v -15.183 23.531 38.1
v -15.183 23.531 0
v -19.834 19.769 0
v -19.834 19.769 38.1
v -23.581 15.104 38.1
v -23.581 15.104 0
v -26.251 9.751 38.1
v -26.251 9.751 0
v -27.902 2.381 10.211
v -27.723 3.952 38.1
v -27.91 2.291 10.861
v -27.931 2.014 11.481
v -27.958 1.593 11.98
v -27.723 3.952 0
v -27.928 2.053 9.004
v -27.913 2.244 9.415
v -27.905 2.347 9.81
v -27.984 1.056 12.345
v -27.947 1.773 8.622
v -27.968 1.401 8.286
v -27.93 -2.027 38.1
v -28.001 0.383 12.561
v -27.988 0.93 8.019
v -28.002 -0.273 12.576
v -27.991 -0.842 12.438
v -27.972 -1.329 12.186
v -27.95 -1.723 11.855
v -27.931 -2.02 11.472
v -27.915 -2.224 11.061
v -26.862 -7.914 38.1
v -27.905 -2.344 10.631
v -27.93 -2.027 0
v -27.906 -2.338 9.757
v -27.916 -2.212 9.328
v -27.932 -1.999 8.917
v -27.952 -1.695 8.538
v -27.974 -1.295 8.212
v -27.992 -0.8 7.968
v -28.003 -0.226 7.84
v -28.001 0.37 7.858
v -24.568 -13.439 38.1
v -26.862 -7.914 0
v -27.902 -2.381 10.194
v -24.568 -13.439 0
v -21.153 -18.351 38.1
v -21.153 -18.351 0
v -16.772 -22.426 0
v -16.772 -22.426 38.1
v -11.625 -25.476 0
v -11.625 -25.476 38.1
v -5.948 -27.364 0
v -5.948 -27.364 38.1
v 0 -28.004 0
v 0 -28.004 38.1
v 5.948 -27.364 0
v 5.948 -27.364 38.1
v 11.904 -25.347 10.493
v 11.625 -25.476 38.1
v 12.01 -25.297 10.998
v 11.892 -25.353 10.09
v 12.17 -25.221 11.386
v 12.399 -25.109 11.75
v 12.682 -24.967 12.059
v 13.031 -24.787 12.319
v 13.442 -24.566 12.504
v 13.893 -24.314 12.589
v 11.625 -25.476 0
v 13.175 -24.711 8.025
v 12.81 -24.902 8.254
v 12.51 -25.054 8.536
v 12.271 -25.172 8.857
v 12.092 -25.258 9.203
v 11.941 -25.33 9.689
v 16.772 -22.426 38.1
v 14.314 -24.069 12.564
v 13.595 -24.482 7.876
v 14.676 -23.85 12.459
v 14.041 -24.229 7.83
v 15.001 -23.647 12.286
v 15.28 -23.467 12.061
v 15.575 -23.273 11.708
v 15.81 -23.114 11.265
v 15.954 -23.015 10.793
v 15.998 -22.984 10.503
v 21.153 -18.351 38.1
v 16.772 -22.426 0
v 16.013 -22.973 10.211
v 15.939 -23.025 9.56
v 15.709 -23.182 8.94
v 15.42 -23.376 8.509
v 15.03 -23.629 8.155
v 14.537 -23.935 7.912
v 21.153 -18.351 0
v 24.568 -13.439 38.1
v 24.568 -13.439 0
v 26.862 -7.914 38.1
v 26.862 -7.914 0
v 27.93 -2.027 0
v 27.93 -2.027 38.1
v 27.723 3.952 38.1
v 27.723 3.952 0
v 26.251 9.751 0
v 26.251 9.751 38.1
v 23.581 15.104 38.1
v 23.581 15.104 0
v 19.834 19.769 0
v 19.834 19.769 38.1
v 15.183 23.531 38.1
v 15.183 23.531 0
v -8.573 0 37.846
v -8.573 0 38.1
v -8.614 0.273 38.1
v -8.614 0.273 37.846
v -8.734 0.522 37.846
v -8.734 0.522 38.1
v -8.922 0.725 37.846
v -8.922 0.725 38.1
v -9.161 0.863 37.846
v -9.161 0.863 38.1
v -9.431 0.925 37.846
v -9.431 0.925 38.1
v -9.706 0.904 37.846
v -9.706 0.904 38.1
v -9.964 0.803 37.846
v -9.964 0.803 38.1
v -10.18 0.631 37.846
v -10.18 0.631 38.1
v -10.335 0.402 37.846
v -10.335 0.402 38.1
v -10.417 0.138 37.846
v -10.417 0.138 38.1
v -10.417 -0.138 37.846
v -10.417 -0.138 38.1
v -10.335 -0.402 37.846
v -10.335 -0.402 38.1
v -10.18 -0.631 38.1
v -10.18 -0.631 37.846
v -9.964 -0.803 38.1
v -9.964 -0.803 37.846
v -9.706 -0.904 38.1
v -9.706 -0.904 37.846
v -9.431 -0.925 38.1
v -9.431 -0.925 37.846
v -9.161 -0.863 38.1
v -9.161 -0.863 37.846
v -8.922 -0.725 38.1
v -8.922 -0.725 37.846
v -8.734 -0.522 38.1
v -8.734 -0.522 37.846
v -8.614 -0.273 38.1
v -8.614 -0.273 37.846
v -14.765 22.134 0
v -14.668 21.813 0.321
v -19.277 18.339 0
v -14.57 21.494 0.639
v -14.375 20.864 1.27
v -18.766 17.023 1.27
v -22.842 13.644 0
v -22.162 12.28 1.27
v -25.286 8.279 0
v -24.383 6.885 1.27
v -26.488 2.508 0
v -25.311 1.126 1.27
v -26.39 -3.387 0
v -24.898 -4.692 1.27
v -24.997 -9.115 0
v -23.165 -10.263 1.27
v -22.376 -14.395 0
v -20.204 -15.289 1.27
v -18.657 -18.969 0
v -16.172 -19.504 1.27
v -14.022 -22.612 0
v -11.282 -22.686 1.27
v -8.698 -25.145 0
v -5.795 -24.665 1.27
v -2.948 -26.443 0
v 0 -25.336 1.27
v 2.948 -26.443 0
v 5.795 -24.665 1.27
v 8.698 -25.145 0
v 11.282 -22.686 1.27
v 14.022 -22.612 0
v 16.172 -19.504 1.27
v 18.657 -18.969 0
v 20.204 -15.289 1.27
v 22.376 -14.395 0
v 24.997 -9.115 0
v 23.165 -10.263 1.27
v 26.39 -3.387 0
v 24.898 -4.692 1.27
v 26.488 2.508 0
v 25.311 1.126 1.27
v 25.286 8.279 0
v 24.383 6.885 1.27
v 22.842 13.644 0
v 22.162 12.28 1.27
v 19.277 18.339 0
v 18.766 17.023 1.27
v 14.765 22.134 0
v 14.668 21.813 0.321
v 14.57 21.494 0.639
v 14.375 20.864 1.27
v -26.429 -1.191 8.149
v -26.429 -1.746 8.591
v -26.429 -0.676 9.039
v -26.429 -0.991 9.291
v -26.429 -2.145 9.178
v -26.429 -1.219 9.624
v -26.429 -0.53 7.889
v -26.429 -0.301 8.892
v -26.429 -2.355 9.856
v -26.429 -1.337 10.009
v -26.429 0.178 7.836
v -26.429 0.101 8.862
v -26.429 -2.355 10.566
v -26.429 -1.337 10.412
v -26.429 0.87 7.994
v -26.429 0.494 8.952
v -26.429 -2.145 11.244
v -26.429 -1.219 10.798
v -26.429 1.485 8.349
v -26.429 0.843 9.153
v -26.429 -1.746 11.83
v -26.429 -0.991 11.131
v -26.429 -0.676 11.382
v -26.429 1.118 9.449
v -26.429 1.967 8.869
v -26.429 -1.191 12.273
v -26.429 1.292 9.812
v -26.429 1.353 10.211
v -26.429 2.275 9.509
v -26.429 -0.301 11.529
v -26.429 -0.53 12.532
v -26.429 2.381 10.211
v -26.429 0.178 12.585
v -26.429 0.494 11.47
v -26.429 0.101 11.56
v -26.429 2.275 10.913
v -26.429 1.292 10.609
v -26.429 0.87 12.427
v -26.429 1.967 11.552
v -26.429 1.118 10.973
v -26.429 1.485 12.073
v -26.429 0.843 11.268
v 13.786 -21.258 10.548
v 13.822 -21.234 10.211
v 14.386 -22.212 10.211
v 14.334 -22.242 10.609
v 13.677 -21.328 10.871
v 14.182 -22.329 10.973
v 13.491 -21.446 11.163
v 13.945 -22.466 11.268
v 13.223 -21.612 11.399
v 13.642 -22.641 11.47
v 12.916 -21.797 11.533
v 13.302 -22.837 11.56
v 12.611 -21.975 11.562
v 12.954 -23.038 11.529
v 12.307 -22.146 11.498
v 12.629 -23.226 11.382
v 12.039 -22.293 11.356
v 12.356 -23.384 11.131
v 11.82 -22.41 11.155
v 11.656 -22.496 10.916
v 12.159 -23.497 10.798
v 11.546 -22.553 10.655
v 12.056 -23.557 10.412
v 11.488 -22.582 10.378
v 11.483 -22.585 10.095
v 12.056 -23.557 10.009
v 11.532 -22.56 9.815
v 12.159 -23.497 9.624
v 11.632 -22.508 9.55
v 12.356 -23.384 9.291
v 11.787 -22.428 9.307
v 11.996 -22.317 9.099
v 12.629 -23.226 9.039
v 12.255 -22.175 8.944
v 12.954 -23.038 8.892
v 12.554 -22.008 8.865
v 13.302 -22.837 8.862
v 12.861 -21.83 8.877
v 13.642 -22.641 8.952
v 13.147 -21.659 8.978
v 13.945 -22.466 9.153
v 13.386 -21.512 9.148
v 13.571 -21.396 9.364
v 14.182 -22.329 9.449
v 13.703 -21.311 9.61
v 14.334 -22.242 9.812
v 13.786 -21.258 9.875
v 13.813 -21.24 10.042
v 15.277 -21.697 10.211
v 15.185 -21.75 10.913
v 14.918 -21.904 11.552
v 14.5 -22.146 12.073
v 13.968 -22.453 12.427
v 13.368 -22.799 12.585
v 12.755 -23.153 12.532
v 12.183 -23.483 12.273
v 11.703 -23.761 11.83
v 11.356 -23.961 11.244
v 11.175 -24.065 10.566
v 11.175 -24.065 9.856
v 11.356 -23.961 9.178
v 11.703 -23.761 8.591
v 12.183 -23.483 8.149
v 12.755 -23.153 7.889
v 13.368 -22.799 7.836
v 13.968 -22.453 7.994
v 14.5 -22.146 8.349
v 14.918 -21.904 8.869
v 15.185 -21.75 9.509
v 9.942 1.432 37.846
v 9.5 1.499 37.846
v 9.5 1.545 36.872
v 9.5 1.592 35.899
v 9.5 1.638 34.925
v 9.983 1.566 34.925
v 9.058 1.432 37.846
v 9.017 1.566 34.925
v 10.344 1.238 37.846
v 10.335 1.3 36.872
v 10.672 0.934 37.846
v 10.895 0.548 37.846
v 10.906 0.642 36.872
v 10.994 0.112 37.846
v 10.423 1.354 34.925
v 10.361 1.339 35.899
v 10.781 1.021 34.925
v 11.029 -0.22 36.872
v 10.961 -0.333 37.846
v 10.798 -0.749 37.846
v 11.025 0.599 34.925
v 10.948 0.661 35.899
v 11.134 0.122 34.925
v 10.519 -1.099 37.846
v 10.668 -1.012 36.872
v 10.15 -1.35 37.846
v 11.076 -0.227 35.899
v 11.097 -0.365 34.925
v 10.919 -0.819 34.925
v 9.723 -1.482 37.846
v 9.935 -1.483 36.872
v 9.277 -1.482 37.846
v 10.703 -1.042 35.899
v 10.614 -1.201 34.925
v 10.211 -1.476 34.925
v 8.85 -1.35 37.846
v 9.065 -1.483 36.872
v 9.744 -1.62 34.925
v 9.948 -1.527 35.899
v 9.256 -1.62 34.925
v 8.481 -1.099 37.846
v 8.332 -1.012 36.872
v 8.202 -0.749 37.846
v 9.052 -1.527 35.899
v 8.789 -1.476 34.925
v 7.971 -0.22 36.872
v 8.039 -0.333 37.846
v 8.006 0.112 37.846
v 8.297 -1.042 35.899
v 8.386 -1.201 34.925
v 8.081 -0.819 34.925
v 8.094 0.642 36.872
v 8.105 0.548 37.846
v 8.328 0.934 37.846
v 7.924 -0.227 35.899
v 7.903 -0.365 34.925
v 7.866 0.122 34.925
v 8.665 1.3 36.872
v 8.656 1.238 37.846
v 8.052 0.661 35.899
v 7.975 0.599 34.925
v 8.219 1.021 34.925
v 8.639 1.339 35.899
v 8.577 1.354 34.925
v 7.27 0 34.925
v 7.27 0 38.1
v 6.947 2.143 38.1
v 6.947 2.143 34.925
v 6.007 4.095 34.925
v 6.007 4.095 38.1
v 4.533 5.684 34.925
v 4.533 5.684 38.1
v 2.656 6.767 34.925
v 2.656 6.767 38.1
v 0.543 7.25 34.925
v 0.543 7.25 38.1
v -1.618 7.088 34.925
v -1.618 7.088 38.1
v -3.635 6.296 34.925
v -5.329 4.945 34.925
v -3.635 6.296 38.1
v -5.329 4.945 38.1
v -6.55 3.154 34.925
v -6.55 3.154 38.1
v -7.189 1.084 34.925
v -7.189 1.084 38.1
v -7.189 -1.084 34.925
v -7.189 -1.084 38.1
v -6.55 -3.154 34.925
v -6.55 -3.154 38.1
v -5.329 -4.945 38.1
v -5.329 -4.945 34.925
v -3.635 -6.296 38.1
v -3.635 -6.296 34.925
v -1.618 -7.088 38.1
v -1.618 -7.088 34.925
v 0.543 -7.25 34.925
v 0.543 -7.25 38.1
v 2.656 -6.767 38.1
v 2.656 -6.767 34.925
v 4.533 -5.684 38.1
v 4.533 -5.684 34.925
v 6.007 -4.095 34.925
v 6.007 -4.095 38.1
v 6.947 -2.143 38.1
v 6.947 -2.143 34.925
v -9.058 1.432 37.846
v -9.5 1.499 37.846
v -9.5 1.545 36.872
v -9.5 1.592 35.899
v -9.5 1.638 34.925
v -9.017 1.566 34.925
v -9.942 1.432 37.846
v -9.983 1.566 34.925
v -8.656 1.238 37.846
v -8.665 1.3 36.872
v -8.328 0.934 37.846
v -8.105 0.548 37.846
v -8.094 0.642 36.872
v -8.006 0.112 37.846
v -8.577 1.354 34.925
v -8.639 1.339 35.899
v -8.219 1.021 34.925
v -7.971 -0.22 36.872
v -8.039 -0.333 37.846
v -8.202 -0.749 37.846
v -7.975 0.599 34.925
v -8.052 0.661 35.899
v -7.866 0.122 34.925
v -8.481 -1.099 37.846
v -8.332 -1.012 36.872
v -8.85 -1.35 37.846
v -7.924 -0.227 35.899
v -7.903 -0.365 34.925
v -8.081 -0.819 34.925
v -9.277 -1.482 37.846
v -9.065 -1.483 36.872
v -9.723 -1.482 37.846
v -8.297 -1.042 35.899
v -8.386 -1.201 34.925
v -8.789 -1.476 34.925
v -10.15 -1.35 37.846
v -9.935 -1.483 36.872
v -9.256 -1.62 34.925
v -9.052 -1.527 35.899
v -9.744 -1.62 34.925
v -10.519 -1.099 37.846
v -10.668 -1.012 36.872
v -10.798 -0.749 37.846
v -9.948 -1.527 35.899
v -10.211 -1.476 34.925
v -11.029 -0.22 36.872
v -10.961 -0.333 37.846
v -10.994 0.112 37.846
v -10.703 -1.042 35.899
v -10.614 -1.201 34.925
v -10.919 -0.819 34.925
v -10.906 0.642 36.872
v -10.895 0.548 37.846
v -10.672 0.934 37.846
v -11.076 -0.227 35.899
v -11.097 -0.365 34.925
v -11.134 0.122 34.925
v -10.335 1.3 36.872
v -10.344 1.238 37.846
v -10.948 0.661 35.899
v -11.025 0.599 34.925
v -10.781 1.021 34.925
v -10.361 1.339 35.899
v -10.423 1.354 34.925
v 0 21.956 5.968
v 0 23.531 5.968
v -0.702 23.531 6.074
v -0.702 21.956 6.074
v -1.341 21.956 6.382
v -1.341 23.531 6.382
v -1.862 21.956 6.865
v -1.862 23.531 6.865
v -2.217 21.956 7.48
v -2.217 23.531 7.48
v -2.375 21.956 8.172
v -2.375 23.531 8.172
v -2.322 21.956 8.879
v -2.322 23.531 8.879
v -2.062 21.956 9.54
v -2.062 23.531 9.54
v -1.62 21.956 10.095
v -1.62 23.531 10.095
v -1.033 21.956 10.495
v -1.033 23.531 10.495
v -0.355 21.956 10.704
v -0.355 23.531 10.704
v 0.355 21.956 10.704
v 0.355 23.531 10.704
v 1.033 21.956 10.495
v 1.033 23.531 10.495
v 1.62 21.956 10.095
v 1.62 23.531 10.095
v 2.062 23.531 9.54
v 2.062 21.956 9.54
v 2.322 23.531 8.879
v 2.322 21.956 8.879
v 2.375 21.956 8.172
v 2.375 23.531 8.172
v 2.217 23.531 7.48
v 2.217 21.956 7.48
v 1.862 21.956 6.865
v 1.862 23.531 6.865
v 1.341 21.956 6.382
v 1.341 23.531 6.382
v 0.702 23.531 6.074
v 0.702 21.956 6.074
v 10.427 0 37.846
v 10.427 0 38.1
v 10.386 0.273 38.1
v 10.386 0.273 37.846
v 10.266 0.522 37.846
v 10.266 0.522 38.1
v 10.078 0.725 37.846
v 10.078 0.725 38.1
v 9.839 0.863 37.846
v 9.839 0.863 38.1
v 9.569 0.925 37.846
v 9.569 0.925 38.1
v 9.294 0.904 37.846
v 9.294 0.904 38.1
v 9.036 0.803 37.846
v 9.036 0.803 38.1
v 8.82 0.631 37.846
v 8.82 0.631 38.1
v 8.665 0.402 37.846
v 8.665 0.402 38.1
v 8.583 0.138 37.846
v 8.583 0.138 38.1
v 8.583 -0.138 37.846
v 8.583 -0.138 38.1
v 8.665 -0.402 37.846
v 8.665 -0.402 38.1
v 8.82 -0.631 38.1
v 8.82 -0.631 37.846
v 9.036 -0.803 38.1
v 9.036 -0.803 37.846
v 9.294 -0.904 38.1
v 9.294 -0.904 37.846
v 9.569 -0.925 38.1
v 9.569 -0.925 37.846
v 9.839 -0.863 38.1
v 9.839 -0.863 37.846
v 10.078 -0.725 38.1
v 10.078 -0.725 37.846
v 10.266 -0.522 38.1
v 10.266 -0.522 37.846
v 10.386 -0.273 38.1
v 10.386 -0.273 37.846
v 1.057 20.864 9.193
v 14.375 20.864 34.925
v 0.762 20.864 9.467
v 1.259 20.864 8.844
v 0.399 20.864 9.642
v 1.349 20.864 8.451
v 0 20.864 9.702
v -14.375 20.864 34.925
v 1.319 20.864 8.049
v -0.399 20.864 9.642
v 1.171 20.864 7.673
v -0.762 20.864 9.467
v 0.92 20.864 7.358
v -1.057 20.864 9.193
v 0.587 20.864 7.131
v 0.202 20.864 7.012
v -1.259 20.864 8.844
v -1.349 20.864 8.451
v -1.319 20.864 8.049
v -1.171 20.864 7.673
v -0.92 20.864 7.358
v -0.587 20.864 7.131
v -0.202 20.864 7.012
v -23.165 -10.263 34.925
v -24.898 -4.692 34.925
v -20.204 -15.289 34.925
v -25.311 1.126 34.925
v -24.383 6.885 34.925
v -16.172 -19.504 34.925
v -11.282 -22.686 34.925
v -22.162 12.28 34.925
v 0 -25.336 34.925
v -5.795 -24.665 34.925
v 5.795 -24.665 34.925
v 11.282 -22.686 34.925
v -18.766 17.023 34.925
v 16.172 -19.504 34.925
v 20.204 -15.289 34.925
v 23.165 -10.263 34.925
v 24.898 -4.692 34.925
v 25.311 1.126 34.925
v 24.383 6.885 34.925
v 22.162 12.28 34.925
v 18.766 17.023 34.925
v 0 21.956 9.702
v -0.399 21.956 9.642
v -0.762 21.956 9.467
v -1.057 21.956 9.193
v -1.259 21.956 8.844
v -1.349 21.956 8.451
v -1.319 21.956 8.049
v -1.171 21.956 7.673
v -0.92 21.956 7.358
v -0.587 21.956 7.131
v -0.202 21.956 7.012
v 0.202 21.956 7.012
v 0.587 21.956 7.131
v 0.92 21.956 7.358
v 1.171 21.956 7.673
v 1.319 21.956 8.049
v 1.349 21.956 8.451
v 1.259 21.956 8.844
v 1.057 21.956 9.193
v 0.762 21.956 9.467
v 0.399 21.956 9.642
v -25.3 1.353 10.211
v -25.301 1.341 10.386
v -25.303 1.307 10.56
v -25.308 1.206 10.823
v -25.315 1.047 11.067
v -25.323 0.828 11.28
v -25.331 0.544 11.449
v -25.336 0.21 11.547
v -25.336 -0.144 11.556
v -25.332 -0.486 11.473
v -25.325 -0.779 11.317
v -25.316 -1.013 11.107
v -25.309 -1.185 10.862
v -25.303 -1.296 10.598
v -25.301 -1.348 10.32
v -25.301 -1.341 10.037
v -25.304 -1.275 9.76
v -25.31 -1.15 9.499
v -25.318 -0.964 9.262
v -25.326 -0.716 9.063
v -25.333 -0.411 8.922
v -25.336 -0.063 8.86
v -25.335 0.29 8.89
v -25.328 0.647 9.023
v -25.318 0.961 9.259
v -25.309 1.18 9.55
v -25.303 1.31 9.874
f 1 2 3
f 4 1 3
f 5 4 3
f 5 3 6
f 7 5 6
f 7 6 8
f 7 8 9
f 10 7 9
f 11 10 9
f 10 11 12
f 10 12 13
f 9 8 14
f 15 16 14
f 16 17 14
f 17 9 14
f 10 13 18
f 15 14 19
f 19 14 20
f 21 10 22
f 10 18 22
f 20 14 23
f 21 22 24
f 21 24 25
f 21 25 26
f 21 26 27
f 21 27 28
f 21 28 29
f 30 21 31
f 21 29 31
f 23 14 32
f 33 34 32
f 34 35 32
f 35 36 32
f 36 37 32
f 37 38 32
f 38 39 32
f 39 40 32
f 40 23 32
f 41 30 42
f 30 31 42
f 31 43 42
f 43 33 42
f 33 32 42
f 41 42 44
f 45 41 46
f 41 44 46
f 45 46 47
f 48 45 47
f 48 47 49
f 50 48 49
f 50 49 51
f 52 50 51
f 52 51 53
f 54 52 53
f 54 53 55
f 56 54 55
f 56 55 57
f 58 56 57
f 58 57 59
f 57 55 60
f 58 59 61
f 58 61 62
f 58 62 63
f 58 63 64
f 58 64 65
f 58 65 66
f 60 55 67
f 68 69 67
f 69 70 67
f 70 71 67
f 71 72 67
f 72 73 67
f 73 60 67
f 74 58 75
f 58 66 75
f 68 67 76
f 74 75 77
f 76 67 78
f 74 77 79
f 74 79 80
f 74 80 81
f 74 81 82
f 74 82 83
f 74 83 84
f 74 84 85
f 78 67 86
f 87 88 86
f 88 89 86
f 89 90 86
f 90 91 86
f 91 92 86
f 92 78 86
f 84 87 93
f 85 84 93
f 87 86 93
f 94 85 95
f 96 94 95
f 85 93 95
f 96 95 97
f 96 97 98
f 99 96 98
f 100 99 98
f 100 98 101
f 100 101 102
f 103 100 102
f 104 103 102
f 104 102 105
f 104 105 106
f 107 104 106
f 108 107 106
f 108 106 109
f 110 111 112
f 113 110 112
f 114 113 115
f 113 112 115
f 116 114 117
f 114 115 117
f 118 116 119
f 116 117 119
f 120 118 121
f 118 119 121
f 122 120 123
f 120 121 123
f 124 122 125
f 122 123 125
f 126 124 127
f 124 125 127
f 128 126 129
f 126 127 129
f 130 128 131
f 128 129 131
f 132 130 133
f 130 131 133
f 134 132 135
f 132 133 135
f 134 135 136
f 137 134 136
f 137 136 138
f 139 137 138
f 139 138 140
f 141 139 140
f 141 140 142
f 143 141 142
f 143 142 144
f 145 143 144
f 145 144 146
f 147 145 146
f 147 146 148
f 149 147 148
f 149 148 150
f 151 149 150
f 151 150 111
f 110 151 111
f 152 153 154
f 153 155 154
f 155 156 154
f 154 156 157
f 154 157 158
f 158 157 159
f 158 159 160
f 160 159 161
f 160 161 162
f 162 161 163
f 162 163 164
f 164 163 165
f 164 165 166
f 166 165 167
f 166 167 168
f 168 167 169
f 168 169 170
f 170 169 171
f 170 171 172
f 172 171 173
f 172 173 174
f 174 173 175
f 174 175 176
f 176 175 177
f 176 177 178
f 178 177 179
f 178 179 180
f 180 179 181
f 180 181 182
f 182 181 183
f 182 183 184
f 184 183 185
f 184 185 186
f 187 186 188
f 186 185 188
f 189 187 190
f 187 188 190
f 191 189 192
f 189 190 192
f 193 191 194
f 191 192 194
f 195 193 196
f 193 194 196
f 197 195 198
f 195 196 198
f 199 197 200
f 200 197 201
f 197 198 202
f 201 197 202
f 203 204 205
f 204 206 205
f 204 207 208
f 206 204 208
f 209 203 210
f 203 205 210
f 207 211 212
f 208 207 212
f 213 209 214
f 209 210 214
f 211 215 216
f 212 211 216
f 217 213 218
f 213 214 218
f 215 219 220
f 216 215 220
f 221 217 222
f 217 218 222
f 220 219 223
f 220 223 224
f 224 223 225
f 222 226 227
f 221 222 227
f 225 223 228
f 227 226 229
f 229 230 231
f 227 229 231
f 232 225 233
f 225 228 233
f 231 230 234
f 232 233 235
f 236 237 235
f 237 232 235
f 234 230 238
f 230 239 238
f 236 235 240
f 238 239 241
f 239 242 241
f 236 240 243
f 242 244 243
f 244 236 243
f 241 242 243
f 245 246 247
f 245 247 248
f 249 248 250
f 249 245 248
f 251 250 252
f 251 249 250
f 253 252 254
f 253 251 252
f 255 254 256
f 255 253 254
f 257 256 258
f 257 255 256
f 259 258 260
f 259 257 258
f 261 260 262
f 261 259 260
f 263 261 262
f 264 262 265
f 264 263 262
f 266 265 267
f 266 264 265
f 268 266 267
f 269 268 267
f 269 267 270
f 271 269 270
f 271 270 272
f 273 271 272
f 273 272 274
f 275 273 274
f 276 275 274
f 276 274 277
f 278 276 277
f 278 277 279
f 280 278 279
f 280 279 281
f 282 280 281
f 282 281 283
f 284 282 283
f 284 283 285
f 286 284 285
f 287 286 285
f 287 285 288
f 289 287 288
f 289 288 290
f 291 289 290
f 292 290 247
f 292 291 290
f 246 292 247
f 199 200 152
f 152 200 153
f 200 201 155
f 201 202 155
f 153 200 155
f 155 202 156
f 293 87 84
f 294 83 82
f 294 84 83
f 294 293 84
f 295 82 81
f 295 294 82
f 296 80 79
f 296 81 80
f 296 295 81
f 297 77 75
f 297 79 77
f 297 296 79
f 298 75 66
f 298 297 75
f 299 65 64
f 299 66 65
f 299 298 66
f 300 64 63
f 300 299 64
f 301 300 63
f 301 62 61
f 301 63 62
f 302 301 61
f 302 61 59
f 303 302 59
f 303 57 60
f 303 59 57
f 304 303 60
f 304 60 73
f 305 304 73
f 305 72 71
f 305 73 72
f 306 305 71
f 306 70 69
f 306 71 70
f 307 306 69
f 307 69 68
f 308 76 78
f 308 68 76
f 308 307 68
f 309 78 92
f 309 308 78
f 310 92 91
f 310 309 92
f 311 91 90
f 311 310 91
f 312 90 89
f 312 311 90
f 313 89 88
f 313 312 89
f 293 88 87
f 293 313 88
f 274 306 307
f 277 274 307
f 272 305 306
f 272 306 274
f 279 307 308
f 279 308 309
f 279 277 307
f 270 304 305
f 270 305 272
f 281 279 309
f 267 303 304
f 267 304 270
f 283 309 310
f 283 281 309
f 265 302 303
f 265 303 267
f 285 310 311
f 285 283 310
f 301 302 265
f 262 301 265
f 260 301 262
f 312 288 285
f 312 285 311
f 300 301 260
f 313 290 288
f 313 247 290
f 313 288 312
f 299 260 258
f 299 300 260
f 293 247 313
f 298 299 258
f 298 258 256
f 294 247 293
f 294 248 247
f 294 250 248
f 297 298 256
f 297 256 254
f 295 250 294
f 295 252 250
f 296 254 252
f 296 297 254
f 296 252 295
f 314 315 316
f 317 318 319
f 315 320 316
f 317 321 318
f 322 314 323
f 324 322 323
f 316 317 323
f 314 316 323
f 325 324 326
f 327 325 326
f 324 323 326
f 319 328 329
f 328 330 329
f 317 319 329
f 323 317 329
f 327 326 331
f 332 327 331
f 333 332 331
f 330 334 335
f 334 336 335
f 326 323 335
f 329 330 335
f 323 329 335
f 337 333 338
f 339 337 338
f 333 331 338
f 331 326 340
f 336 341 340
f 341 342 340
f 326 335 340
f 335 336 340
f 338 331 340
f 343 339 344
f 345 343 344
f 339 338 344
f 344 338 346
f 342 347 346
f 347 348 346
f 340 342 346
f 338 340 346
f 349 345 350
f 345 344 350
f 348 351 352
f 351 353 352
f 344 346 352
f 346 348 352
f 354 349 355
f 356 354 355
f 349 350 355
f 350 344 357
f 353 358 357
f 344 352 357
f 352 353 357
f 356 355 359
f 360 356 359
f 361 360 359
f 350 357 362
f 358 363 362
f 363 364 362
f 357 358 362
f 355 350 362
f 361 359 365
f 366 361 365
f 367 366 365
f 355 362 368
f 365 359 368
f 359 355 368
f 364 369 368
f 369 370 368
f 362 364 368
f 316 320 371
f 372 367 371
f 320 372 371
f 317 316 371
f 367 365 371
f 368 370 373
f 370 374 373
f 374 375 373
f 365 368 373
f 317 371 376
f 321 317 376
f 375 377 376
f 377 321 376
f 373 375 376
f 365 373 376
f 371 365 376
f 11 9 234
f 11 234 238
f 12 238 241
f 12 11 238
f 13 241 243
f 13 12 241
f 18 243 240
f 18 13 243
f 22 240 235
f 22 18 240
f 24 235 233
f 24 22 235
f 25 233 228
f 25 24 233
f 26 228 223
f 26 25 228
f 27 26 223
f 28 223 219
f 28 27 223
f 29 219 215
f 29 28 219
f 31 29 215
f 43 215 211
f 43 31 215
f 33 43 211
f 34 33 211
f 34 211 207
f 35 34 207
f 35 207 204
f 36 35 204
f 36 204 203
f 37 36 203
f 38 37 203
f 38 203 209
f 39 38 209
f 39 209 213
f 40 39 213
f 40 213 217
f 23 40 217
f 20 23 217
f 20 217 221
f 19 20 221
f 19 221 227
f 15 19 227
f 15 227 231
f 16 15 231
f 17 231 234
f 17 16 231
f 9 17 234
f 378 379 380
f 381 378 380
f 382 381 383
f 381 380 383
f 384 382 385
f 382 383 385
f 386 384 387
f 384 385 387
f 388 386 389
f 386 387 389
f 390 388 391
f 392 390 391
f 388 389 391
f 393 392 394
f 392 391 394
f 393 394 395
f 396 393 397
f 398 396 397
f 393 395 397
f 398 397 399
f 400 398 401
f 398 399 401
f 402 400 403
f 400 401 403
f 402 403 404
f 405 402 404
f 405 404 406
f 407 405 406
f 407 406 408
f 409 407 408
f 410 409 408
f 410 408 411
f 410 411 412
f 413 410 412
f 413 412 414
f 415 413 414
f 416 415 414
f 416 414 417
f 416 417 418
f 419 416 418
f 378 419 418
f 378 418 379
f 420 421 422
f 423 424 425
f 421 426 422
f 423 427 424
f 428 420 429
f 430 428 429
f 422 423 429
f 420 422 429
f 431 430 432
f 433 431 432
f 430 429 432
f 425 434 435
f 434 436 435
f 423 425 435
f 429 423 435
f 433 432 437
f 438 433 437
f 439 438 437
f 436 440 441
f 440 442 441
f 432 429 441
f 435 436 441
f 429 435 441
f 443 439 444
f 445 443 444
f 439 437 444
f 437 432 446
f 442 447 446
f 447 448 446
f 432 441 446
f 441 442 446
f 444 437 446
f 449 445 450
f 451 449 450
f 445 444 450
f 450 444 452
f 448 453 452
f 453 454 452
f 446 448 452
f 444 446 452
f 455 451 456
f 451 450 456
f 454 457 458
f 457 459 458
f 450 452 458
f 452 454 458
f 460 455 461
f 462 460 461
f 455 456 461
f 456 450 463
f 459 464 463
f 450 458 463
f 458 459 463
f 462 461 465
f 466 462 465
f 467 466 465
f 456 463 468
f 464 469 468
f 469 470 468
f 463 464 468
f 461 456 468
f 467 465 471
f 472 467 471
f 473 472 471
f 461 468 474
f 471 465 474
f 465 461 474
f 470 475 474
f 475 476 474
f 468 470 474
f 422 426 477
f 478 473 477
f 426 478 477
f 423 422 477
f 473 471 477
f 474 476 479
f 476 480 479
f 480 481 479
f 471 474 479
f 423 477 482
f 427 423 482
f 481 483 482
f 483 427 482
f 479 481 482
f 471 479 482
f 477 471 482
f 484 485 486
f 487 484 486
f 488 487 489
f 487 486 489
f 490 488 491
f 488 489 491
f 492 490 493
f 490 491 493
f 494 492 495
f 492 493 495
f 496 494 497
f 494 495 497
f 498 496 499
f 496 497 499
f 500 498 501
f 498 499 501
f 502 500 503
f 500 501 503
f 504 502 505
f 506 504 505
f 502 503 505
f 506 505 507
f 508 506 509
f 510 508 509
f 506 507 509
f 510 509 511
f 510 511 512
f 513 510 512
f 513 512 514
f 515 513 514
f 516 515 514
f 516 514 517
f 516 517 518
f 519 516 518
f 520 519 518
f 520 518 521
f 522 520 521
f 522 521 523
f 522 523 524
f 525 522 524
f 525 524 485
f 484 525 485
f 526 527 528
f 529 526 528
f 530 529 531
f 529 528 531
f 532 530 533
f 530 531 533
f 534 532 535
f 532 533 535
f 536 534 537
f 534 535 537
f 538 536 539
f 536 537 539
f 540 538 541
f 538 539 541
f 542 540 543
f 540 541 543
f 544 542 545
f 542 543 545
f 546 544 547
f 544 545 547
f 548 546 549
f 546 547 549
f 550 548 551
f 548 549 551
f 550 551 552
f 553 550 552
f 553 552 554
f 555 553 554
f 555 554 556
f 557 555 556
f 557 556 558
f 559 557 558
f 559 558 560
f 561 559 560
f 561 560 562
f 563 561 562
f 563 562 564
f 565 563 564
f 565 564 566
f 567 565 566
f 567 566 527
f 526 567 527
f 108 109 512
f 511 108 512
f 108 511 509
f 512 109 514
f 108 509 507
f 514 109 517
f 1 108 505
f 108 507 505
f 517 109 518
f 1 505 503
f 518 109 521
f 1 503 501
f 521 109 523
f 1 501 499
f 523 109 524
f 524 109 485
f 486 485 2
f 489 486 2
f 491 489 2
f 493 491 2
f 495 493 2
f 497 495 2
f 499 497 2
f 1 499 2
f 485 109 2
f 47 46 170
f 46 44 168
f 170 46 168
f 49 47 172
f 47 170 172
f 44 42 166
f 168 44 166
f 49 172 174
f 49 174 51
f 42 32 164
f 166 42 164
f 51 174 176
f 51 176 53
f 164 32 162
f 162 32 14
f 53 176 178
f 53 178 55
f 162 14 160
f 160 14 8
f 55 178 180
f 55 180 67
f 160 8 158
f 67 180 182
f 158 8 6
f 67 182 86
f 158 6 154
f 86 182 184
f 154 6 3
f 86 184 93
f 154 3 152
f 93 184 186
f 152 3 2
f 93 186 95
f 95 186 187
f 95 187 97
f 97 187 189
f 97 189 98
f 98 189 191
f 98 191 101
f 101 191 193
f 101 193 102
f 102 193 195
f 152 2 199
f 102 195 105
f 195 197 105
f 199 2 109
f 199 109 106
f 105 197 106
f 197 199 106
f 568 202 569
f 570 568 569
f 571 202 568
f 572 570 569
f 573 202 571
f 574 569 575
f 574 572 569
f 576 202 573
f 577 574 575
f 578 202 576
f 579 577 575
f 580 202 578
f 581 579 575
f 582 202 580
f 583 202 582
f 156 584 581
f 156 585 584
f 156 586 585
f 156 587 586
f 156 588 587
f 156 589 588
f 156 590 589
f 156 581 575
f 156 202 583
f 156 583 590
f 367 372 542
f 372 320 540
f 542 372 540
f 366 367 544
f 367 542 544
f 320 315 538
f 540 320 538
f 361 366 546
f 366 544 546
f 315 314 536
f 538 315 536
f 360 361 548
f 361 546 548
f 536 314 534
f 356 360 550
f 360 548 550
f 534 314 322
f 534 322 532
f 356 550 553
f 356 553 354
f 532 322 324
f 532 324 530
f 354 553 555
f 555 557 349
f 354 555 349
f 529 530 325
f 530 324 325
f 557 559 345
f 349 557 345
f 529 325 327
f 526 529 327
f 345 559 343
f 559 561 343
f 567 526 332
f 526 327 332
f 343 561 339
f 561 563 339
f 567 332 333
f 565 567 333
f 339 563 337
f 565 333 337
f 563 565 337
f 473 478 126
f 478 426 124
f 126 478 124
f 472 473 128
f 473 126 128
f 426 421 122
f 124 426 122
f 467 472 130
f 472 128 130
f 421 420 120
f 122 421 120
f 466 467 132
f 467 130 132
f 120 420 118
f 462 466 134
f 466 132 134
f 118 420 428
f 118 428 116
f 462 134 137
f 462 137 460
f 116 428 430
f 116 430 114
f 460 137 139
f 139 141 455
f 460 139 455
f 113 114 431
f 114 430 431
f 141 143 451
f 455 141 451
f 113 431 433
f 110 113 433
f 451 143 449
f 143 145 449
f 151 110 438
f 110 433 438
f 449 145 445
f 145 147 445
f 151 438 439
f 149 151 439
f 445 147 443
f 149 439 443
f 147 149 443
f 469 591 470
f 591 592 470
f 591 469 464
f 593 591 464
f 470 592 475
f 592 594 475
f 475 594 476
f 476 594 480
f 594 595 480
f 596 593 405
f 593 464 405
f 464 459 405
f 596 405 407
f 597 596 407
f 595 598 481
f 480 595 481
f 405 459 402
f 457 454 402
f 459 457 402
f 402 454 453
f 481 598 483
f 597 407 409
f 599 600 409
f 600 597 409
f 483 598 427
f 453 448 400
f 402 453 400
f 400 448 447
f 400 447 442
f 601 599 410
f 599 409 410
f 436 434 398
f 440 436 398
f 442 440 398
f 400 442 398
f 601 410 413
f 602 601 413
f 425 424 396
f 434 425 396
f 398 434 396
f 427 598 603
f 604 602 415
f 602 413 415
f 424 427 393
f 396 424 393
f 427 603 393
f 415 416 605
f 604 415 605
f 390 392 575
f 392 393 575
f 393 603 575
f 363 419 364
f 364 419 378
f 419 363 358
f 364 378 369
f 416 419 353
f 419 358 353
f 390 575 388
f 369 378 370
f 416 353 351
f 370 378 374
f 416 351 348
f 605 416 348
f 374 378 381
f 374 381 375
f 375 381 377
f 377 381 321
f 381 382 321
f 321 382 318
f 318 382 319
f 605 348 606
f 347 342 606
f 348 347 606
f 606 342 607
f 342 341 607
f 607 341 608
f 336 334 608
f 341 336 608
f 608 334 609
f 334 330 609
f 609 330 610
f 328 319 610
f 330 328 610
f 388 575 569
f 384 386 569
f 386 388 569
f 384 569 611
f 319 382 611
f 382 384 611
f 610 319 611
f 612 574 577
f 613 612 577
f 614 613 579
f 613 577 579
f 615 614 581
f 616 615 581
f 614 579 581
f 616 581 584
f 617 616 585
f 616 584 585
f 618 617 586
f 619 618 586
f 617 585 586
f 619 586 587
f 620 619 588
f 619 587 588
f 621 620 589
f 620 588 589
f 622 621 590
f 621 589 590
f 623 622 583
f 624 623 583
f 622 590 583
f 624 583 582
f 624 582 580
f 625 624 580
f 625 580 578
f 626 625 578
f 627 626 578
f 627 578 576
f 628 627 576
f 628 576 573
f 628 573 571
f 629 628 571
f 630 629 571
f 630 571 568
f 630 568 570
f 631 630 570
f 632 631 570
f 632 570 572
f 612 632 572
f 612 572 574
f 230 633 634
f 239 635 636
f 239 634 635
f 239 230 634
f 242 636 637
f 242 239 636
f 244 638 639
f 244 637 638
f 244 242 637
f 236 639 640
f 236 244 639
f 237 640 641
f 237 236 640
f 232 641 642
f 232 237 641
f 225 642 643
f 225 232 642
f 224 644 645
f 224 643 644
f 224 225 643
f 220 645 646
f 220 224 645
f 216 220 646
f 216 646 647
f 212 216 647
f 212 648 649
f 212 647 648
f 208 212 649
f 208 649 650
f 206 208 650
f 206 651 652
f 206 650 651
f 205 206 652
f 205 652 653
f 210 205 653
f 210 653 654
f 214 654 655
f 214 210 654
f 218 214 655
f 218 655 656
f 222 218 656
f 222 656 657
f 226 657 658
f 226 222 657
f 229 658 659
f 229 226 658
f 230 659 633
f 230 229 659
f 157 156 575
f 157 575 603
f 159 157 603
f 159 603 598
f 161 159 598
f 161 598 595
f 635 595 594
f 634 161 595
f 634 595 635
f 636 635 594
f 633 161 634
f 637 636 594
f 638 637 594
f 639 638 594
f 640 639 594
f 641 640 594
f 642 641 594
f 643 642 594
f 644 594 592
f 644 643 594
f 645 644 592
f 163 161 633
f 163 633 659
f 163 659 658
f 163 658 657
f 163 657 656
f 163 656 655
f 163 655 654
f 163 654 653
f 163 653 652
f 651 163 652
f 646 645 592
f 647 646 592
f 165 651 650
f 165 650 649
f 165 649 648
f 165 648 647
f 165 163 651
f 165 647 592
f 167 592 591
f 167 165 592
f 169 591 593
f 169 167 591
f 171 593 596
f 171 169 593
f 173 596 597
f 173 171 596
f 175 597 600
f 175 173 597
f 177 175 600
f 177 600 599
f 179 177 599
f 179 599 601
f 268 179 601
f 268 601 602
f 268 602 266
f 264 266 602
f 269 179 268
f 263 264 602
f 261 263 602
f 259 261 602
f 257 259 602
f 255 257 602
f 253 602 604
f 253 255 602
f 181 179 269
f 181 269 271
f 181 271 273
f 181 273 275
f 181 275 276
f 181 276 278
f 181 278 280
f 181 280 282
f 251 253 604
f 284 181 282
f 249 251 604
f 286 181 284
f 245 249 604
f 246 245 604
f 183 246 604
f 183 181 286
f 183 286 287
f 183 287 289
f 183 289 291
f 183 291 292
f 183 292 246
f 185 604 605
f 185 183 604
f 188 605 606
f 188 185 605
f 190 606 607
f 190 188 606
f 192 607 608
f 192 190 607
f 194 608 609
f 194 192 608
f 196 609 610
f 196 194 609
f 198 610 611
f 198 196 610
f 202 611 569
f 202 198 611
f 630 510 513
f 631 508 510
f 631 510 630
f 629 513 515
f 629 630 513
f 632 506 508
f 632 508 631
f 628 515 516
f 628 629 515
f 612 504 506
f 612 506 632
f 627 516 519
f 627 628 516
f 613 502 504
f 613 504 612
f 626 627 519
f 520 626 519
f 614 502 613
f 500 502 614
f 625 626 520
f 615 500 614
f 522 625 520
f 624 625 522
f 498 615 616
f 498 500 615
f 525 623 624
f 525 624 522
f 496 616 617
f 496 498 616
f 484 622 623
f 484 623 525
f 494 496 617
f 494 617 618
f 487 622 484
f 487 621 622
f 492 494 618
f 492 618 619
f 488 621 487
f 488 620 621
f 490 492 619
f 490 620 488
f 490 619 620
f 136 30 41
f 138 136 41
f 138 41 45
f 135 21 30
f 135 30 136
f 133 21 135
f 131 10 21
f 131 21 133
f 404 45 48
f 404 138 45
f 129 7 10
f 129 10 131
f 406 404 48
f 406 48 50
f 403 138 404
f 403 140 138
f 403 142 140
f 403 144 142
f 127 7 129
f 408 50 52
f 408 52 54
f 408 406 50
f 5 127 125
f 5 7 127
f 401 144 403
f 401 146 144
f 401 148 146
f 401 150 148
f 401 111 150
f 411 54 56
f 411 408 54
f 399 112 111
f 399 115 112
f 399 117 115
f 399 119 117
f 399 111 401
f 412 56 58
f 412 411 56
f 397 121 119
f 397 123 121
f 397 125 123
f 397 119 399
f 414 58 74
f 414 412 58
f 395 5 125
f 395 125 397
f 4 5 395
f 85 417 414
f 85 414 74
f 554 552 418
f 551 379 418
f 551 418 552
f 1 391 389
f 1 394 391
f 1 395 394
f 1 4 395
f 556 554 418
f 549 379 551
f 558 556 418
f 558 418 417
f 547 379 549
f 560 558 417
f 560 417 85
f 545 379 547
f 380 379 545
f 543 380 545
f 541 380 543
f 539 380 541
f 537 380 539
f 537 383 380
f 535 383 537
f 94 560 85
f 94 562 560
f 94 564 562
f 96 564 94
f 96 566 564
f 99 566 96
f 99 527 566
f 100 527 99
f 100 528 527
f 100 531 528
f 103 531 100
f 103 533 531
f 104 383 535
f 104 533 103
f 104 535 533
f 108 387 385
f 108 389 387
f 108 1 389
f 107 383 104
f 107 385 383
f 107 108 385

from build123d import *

# Parameters (mm, degrees)
BOSS_EXTRUDE1_DEPTH                             = 38.1
BOSS_EXTRUDE2_START                             = -3.175
BOSS_EXTRUDE2_DEPTH                             = 3.175
CBORE_FOR_2_PAN_HEAD_MACHINE_SCREW1_D           = 2.7051
CBORE_FOR_2_PAN_HEAD_MACHINE_SCREW1_DEPTH       = 2.667
CBORE_FOR_2_PAN_HEAD_MACHINE_SCREW1_CBORE_D     = 4.7625
CBORE_FOR_2_PAN_HEAD_MACHINE_SCREW1_CBORE_DEPTH = 1.5748
CBORE_START                                     = 26.4287
CBORE_FOR_2_PAN_HEAD_MACHINE_SCREW2_OUT_R       = 2.38125
CBORE_FOR_2_PAN_HEAD_MACHINE_SCREW2_DEPTH       = 1.574800075
CBORE_START_2                                   = 25.300372244
CBORE_FOR_2_PAN_HEAD_MACHINE_SCREW2_2_O_R       = 1.35255
CBORE_FOR_2_PAN_HEAD_MACHINE_SCREW2_2_DEPTH     = 1.128327756
CBORE_START_3                                   = -28.003500101
CBORE_FOR_2_PAN_HEAD_MACHINE_SCREW3_OUT_R       = 2.38125
CBORE_FOR_2_PAN_HEAD_MACHINE_SCREW3_DEPTH       = 1.574800101
CBORE_START_4                                   = -26.4287
CBORE_FOR_2_PAN_HEAD_MACHINE_SCREW3_2_O_R       = 1.35255
CBORE_FOR_2_PAN_HEAD_MACHINE_SCREW3_2_DEPTH     = 1.128327733
CUT_EXTRUDE1_REACH                              = 56.955
SKETCH20_R                                      = 7.27
HOLE1_AT_2_COUNT                                = 2
HOLE1_AT_2_PITCH                                = 19
F_0_CLEARANCE_HOLE1_D                           = 1.8542
CHAMFER1_SIZE                                   = 1.27


# Read off the part's stored shape, not the designer's step: CBORE for #2 Pan Head Machine Screw2, CBORE for #2 Pan Head Machine Screw3
with BuildPart() as part:
    # Sketch1 → Boss-Extrude1 (new body)
    with BuildSketch(Plane.XY):
        with BuildLine():
            Line((15.182514888, 23.53056), (-15.182514888, 23.53056))
            ThreePointArc((-15.182514888, 23.53056), (0, -28.0035), (15.182514888, 23.53056))
        make_face()
        with BuildLine():
            Line((14.375329435, 20.86356), (-14.375329435, 20.86356))
            ThreePointArc((-14.375329435, 20.86356), (0, -25.3365), (14.375329435, 20.86356))
        make_face(mode=Mode.SUBTRACT)
    extrude(amount=BOSS_EXTRUDE1_DEPTH)

    # Sketch10 → Boss-Extrude2 (add)
    with BuildSketch(Plane.XY.offset(38.1).offset(BOSS_EXTRUDE2_START)):
        with BuildLine():
            Line((15.182514888, 23.53056), (-15.182514888, 23.53056))
            ThreePointArc((-15.182514888, 23.53056), (0, -28.0035), (15.182514888, 23.53056))
        make_face()
    extrude(amount=BOSS_EXTRUDE2_DEPTH)

    # CBORE for #2 Pan Head Machine Screw1
    with Locations(Plane(origin=(-7.747359339, 23.53056, 10.2108), x_dir=(0, 0, -1), z_dir=(0, 1, 0))):
        with Locations((1.8613, -7.747359339)):
            CounterBoreHole(CBORE_FOR_2_PAN_HEAD_MACHINE_SCREW1_D / 2, CBORE_FOR_2_PAN_HEAD_MACHINE_SCREW1_CBORE_D / 2, CBORE_FOR_2_PAN_HEAD_MACHINE_SCREW1_CBORE_DEPTH, depth=CBORE_FOR_2_PAN_HEAD_MACHINE_SCREW1_DEPTH)

    # CBORE for #2 Pan Head Machine Screw2 out → CBORE for #2 Pan Head Machine Screw2 (cut)
    with BuildSketch(Plane(origin=(0, 0, 0), x_dir=(0.8660254037844416, 0.4999999999999948, 0), z_dir=(0.4999999999999948, -0.8660254037844417, 0)).offset(CBORE_START)):
        with Locations((0, 10.2108)):
            Circle(CBORE_FOR_2_PAN_HEAD_MACHINE_SCREW2_OUT_R)
    extrude(amount=CBORE_FOR_2_PAN_HEAD_MACHINE_SCREW2_DEPTH, mode=Mode.SUBTRACT)

    # CBORE for _2 Pan Head Machine Screw2 2 o → CBORE for _2 Pan Head Machine Screw2 2 (cut)
    with BuildSketch(Plane(origin=(0, 0, 0), x_dir=(0.8660254037844416, 0.4999999999999948, 0), z_dir=(0.4999999999999948, -0.8660254037844417, 0)).offset(CBORE_START_2)):
        with Locations((0, 10.2108)):
            Circle(CBORE_FOR_2_PAN_HEAD_MACHINE_SCREW2_2_O_R)
    extrude(amount=CBORE_FOR_2_PAN_HEAD_MACHINE_SCREW2_2_DEPTH, mode=Mode.SUBTRACT)

    # CBORE for #2 Pan Head Machine Screw3 out → CBORE for #2 Pan Head Machine Screw3 (cut)
    with BuildSketch(Plane.YZ.offset(CBORE_START_3)):
        with Locations((0, 10.2108)):
            Circle(CBORE_FOR_2_PAN_HEAD_MACHINE_SCREW3_OUT_R)
    extrude(amount=CBORE_FOR_2_PAN_HEAD_MACHINE_SCREW3_DEPTH, mode=Mode.SUBTRACT)

    # CBORE for _2 Pan Head Machine Screw3 2 o → CBORE for _2 Pan Head Machine Screw3 2 (cut)
    with BuildSketch(Plane.YZ.offset(CBORE_START_4)):
        with Locations((0, 10.2108)):
            Circle(CBORE_FOR_2_PAN_HEAD_MACHINE_SCREW3_2_O_R)
    extrude(amount=CBORE_FOR_2_PAN_HEAD_MACHINE_SCREW3_2_DEPTH, mode=Mode.SUBTRACT)

    # Sketch20 → Cut-Extrude1 (cut, up to next)
    with BuildSketch(Plane.XY.offset(38.1), mode=Mode.PRIVATE) as cut_extrude1_sk1:
        Circle(SKETCH20_R)
    cut_extrude1_tool1 = extrude(cut_extrude1_sk1.sketch, amount=-CUT_EXTRUDE1_REACH, mode=Mode.PRIVATE) & part.part
    add(cut_extrude1_tool1.solids().sort_by_distance((0, 0, 38.1))[0], mode=Mode.SUBTRACT)

    # Sketch22 → Hole1 (revolve, cut)
    with BuildSketch(Plane(origin=(9.5, 0, 34.925), x_dir=(0, 1, 0), z_dir=(1, 0, 0))):
        Polygon((0, 0), (0, 2.921), (1.4986, 2.921), (1.6383, 0), align=None)
    hole1 = revolve(axis=Axis((9.5, 0, 144.925), (0, 0, -1)), mode=Mode.SUBTRACT)

    # Hole1 at 2: Hole1 ×2
    with Locations(*[(-i * HOLE1_AT_2_PITCH, 0, 0) for i in range(1, HOLE1_AT_2_COUNT)]):
        add(hole1, mode=Mode.SUBTRACT)

    # #0 Clearance Hole1 (through all)
    with Locations(Plane(origin=(0, 0, 34.925), x_dir=(-1, 0, 0), z_dir=(0, 0, -1))):
        with Locations((-9.5, 0), (9.5, 0)):
            Hole(F_0_CLEARANCE_HOLE1_D / 2)

    # Chamfer1
    chamfer1_edges = [part.edges().sort_by_distance(p)[0] for p in [
        (0, -25.3365, 0),
        (0, 20.86356, 0),
    ]]
    chamfer(chamfer1_edges, length=CHAMFER1_SIZE)


solid = part.part
